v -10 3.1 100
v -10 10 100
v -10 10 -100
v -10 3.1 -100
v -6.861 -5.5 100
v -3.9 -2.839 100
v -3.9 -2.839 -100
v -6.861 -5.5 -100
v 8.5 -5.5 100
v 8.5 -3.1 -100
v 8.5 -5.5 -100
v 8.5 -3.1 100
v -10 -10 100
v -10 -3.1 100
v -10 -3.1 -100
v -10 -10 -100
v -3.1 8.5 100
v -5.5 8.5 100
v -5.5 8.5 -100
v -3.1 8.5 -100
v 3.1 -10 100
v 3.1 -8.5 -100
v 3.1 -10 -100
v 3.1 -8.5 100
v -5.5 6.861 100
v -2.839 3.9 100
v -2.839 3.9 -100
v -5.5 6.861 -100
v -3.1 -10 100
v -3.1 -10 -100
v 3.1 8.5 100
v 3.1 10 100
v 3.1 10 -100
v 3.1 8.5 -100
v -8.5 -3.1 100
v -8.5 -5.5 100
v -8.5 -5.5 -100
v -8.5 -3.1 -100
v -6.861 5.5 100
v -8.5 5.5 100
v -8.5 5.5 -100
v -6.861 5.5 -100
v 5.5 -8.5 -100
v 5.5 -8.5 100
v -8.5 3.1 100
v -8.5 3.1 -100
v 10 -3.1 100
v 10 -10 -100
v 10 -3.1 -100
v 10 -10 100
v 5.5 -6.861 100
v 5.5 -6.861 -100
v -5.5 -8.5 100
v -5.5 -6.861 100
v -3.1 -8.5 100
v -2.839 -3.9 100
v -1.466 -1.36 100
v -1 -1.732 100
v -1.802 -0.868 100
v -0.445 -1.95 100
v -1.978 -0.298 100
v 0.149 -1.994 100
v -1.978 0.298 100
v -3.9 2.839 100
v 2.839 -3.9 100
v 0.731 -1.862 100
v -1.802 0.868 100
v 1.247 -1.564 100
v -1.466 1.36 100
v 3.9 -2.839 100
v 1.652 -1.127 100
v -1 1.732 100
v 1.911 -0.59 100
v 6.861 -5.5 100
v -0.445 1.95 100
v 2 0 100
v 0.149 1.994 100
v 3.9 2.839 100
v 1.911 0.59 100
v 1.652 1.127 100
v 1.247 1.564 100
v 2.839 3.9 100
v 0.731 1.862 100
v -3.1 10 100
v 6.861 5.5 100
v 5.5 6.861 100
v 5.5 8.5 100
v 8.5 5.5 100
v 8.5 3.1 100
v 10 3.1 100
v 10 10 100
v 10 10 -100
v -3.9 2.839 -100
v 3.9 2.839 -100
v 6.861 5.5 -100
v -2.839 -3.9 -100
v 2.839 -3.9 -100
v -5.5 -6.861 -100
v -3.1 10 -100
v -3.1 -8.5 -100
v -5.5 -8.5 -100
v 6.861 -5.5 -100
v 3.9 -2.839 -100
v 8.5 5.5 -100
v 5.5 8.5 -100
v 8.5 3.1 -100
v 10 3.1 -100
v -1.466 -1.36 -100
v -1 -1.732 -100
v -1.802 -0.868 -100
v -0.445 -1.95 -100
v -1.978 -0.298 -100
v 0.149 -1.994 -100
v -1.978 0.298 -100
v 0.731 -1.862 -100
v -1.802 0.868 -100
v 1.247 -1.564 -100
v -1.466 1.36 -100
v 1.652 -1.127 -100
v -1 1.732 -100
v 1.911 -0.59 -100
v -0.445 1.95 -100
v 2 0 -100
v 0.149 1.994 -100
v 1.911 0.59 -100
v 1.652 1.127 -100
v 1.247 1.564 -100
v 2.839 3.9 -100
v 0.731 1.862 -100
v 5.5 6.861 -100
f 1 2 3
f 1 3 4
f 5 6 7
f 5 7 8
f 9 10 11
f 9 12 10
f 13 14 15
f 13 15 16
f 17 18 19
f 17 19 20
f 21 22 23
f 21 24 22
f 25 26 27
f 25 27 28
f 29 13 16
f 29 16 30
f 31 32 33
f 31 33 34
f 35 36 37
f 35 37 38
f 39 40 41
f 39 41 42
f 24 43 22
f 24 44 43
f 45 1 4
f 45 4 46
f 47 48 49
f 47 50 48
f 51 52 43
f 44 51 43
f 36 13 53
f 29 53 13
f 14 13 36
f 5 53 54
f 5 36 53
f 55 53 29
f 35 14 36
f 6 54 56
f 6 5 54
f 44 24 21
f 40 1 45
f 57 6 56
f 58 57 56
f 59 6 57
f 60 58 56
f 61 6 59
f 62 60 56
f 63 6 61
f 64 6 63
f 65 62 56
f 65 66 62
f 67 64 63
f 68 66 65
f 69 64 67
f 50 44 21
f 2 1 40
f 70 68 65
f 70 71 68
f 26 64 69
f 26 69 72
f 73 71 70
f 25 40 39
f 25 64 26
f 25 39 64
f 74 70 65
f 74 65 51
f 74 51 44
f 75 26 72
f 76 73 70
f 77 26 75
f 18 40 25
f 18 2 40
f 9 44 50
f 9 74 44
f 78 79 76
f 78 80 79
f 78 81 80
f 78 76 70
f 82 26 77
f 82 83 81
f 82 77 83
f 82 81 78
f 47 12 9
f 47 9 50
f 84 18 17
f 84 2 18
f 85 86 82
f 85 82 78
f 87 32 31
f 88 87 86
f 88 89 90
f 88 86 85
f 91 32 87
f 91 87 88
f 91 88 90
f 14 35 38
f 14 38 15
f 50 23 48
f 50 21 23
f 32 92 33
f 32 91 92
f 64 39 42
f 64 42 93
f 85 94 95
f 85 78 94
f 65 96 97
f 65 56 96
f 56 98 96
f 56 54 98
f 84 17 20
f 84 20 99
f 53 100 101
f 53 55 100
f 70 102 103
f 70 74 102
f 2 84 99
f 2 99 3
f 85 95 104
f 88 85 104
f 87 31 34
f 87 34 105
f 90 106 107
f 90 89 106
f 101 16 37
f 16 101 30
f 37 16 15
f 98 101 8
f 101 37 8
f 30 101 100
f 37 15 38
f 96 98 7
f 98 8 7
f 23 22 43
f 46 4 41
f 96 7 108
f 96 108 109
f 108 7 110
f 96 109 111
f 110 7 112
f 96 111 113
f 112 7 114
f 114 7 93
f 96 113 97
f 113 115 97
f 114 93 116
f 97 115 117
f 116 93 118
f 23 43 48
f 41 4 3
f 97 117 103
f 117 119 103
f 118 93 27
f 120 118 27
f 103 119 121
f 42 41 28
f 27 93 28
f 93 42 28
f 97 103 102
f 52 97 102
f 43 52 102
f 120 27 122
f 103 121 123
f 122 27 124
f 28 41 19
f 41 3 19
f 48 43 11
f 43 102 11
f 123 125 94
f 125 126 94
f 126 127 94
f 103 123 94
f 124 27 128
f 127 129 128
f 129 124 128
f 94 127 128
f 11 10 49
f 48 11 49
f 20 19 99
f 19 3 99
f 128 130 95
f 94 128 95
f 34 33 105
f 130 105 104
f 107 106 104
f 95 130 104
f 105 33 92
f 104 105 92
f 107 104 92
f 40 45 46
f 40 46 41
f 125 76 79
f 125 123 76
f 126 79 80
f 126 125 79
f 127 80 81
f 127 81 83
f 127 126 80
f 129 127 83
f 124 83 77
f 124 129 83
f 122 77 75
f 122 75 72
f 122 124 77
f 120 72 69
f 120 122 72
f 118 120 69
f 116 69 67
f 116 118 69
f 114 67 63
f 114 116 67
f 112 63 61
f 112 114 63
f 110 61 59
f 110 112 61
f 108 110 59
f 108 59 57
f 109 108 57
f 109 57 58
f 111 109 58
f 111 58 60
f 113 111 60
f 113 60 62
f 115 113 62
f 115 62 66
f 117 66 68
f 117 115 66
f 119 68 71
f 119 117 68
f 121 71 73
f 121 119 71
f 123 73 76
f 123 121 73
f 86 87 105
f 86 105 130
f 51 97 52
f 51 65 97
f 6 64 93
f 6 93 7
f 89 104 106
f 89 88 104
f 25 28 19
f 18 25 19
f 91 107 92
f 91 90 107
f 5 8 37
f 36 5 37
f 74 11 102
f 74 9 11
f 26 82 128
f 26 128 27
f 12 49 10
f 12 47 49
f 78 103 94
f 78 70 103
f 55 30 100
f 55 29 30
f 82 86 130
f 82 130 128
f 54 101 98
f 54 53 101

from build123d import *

# Parameters (mm, degrees)
SKETCH1_R           = 2
BOSS_EXTRUDE1_DEPTH = 100


with BuildPart() as part:
    # Sketch1 → Boss-Extrude1 (new, symmetric)
    with BuildSketch(Plane.XY):
        Polygon((10, 4.610379336), (10, 10), (4.610379336, 10), (3.1, 10), (3.1, 8.5), (5.5, 8.5), (5.5, 6.860660172), (2.839339828, 3.9), (0.519615242, 3.9), (-0.519615242, 3.9), (-2.839339828, 3.9), (-5.5, 6.860660172), (-5.5, 8.5), (-3.1, 8.5), (-3.1, 10), (-4.610379336, 10), (-10, 10), (-10, 4.610379336), (-10, 3.1), (-8.5, 3.1), (-8.5, 5.5), (-6.860660172, 5.5), (-3.9, 2.839339828), (-3.9, 0.519615242), (-3.9, -0.519615242), (-3.9, -2.839339828), (-6.860660172, -5.5), (-8.5, -5.5), (-8.5, -3.1), (-10, -3.1), (-10, -4.610379336), (-10, -10), (-4.610379336, -10), (-3.1, -10), (-3.1, -8.5), (-5.5, -8.5), (-5.5, -6.860660172), (-2.839339828, -3.9), (-0.519615242, -3.9), (0.519615242, -3.9), (2.839339828, -3.9), (5.5, -6.860660172), (5.5, -8.5), (3.1, -8.5), (3.1, -10), (4.610379336, -10), (10, -10), (10, -4.610379336), (10, -3.1), (8.5, -3.1), (8.5, -5.5), (6.860660172, -5.5), (3.9, -2.839339828), (3.9, -0.519615242), (3.9, 0.519615242), (3.9, 2.839339828), (6.860660172, 5.5), (8.5, 5.5), (8.5, 3.1), (10, 3.1), align=None)
        Circle(SKETCH1_R, mode=Mode.SUBTRACT)
    extrude(amount=BOSS_EXTRUDE1_DEPTH, both=True)


solid = part.part
